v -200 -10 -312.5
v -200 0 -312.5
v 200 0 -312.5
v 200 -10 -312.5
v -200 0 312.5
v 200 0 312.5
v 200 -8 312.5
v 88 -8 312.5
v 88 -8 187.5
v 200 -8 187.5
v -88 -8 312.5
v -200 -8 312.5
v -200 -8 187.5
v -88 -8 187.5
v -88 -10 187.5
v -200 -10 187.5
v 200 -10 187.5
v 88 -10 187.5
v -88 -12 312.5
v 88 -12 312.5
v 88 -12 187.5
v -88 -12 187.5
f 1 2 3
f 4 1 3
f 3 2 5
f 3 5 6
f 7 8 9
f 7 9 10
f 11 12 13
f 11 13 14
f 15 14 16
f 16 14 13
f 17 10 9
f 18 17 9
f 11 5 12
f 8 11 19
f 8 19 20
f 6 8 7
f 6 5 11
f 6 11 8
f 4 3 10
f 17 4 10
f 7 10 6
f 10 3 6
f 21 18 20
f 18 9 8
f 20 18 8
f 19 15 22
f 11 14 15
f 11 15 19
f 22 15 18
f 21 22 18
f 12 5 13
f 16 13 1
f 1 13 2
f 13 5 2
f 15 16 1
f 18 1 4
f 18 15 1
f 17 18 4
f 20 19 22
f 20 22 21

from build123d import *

# Parameters (mm, degrees)
F0_W     = 112
F0_H     = 125
F1_DEPTH = 8
F2_DEPTH = 10
F0_W_2   = 176
F3_DEPTH = 12


with BuildPart() as f1:
    # F0 (on Front) → F1 (new body)
    with BuildSketch(Plane.XZ):
        with Locations((-144, 250)):
            Rectangle(F0_W, F0_H)
        with Locations((144, 250)):
            Rectangle(F0_W, F0_H)
    extrude(amount=F1_DEPTH)

    # F0 (on Front) → F2 (join)
    with BuildSketch(Plane.XZ):
        Polygon((-200, 187.5), (-200, -312.5), (200, -312.5), (200, 187.5), (88, 187.5), (-88, 187.5), align=None)
    extrude(amount=F2_DEPTH)

    # F0 (on Front) → F3 (join)
    with BuildSketch(Plane.XZ):
        with Locations((0, 250)):
            Rectangle(F0_W_2, F0_H)
    extrude(amount=F3_DEPTH)


solid = f1.part
